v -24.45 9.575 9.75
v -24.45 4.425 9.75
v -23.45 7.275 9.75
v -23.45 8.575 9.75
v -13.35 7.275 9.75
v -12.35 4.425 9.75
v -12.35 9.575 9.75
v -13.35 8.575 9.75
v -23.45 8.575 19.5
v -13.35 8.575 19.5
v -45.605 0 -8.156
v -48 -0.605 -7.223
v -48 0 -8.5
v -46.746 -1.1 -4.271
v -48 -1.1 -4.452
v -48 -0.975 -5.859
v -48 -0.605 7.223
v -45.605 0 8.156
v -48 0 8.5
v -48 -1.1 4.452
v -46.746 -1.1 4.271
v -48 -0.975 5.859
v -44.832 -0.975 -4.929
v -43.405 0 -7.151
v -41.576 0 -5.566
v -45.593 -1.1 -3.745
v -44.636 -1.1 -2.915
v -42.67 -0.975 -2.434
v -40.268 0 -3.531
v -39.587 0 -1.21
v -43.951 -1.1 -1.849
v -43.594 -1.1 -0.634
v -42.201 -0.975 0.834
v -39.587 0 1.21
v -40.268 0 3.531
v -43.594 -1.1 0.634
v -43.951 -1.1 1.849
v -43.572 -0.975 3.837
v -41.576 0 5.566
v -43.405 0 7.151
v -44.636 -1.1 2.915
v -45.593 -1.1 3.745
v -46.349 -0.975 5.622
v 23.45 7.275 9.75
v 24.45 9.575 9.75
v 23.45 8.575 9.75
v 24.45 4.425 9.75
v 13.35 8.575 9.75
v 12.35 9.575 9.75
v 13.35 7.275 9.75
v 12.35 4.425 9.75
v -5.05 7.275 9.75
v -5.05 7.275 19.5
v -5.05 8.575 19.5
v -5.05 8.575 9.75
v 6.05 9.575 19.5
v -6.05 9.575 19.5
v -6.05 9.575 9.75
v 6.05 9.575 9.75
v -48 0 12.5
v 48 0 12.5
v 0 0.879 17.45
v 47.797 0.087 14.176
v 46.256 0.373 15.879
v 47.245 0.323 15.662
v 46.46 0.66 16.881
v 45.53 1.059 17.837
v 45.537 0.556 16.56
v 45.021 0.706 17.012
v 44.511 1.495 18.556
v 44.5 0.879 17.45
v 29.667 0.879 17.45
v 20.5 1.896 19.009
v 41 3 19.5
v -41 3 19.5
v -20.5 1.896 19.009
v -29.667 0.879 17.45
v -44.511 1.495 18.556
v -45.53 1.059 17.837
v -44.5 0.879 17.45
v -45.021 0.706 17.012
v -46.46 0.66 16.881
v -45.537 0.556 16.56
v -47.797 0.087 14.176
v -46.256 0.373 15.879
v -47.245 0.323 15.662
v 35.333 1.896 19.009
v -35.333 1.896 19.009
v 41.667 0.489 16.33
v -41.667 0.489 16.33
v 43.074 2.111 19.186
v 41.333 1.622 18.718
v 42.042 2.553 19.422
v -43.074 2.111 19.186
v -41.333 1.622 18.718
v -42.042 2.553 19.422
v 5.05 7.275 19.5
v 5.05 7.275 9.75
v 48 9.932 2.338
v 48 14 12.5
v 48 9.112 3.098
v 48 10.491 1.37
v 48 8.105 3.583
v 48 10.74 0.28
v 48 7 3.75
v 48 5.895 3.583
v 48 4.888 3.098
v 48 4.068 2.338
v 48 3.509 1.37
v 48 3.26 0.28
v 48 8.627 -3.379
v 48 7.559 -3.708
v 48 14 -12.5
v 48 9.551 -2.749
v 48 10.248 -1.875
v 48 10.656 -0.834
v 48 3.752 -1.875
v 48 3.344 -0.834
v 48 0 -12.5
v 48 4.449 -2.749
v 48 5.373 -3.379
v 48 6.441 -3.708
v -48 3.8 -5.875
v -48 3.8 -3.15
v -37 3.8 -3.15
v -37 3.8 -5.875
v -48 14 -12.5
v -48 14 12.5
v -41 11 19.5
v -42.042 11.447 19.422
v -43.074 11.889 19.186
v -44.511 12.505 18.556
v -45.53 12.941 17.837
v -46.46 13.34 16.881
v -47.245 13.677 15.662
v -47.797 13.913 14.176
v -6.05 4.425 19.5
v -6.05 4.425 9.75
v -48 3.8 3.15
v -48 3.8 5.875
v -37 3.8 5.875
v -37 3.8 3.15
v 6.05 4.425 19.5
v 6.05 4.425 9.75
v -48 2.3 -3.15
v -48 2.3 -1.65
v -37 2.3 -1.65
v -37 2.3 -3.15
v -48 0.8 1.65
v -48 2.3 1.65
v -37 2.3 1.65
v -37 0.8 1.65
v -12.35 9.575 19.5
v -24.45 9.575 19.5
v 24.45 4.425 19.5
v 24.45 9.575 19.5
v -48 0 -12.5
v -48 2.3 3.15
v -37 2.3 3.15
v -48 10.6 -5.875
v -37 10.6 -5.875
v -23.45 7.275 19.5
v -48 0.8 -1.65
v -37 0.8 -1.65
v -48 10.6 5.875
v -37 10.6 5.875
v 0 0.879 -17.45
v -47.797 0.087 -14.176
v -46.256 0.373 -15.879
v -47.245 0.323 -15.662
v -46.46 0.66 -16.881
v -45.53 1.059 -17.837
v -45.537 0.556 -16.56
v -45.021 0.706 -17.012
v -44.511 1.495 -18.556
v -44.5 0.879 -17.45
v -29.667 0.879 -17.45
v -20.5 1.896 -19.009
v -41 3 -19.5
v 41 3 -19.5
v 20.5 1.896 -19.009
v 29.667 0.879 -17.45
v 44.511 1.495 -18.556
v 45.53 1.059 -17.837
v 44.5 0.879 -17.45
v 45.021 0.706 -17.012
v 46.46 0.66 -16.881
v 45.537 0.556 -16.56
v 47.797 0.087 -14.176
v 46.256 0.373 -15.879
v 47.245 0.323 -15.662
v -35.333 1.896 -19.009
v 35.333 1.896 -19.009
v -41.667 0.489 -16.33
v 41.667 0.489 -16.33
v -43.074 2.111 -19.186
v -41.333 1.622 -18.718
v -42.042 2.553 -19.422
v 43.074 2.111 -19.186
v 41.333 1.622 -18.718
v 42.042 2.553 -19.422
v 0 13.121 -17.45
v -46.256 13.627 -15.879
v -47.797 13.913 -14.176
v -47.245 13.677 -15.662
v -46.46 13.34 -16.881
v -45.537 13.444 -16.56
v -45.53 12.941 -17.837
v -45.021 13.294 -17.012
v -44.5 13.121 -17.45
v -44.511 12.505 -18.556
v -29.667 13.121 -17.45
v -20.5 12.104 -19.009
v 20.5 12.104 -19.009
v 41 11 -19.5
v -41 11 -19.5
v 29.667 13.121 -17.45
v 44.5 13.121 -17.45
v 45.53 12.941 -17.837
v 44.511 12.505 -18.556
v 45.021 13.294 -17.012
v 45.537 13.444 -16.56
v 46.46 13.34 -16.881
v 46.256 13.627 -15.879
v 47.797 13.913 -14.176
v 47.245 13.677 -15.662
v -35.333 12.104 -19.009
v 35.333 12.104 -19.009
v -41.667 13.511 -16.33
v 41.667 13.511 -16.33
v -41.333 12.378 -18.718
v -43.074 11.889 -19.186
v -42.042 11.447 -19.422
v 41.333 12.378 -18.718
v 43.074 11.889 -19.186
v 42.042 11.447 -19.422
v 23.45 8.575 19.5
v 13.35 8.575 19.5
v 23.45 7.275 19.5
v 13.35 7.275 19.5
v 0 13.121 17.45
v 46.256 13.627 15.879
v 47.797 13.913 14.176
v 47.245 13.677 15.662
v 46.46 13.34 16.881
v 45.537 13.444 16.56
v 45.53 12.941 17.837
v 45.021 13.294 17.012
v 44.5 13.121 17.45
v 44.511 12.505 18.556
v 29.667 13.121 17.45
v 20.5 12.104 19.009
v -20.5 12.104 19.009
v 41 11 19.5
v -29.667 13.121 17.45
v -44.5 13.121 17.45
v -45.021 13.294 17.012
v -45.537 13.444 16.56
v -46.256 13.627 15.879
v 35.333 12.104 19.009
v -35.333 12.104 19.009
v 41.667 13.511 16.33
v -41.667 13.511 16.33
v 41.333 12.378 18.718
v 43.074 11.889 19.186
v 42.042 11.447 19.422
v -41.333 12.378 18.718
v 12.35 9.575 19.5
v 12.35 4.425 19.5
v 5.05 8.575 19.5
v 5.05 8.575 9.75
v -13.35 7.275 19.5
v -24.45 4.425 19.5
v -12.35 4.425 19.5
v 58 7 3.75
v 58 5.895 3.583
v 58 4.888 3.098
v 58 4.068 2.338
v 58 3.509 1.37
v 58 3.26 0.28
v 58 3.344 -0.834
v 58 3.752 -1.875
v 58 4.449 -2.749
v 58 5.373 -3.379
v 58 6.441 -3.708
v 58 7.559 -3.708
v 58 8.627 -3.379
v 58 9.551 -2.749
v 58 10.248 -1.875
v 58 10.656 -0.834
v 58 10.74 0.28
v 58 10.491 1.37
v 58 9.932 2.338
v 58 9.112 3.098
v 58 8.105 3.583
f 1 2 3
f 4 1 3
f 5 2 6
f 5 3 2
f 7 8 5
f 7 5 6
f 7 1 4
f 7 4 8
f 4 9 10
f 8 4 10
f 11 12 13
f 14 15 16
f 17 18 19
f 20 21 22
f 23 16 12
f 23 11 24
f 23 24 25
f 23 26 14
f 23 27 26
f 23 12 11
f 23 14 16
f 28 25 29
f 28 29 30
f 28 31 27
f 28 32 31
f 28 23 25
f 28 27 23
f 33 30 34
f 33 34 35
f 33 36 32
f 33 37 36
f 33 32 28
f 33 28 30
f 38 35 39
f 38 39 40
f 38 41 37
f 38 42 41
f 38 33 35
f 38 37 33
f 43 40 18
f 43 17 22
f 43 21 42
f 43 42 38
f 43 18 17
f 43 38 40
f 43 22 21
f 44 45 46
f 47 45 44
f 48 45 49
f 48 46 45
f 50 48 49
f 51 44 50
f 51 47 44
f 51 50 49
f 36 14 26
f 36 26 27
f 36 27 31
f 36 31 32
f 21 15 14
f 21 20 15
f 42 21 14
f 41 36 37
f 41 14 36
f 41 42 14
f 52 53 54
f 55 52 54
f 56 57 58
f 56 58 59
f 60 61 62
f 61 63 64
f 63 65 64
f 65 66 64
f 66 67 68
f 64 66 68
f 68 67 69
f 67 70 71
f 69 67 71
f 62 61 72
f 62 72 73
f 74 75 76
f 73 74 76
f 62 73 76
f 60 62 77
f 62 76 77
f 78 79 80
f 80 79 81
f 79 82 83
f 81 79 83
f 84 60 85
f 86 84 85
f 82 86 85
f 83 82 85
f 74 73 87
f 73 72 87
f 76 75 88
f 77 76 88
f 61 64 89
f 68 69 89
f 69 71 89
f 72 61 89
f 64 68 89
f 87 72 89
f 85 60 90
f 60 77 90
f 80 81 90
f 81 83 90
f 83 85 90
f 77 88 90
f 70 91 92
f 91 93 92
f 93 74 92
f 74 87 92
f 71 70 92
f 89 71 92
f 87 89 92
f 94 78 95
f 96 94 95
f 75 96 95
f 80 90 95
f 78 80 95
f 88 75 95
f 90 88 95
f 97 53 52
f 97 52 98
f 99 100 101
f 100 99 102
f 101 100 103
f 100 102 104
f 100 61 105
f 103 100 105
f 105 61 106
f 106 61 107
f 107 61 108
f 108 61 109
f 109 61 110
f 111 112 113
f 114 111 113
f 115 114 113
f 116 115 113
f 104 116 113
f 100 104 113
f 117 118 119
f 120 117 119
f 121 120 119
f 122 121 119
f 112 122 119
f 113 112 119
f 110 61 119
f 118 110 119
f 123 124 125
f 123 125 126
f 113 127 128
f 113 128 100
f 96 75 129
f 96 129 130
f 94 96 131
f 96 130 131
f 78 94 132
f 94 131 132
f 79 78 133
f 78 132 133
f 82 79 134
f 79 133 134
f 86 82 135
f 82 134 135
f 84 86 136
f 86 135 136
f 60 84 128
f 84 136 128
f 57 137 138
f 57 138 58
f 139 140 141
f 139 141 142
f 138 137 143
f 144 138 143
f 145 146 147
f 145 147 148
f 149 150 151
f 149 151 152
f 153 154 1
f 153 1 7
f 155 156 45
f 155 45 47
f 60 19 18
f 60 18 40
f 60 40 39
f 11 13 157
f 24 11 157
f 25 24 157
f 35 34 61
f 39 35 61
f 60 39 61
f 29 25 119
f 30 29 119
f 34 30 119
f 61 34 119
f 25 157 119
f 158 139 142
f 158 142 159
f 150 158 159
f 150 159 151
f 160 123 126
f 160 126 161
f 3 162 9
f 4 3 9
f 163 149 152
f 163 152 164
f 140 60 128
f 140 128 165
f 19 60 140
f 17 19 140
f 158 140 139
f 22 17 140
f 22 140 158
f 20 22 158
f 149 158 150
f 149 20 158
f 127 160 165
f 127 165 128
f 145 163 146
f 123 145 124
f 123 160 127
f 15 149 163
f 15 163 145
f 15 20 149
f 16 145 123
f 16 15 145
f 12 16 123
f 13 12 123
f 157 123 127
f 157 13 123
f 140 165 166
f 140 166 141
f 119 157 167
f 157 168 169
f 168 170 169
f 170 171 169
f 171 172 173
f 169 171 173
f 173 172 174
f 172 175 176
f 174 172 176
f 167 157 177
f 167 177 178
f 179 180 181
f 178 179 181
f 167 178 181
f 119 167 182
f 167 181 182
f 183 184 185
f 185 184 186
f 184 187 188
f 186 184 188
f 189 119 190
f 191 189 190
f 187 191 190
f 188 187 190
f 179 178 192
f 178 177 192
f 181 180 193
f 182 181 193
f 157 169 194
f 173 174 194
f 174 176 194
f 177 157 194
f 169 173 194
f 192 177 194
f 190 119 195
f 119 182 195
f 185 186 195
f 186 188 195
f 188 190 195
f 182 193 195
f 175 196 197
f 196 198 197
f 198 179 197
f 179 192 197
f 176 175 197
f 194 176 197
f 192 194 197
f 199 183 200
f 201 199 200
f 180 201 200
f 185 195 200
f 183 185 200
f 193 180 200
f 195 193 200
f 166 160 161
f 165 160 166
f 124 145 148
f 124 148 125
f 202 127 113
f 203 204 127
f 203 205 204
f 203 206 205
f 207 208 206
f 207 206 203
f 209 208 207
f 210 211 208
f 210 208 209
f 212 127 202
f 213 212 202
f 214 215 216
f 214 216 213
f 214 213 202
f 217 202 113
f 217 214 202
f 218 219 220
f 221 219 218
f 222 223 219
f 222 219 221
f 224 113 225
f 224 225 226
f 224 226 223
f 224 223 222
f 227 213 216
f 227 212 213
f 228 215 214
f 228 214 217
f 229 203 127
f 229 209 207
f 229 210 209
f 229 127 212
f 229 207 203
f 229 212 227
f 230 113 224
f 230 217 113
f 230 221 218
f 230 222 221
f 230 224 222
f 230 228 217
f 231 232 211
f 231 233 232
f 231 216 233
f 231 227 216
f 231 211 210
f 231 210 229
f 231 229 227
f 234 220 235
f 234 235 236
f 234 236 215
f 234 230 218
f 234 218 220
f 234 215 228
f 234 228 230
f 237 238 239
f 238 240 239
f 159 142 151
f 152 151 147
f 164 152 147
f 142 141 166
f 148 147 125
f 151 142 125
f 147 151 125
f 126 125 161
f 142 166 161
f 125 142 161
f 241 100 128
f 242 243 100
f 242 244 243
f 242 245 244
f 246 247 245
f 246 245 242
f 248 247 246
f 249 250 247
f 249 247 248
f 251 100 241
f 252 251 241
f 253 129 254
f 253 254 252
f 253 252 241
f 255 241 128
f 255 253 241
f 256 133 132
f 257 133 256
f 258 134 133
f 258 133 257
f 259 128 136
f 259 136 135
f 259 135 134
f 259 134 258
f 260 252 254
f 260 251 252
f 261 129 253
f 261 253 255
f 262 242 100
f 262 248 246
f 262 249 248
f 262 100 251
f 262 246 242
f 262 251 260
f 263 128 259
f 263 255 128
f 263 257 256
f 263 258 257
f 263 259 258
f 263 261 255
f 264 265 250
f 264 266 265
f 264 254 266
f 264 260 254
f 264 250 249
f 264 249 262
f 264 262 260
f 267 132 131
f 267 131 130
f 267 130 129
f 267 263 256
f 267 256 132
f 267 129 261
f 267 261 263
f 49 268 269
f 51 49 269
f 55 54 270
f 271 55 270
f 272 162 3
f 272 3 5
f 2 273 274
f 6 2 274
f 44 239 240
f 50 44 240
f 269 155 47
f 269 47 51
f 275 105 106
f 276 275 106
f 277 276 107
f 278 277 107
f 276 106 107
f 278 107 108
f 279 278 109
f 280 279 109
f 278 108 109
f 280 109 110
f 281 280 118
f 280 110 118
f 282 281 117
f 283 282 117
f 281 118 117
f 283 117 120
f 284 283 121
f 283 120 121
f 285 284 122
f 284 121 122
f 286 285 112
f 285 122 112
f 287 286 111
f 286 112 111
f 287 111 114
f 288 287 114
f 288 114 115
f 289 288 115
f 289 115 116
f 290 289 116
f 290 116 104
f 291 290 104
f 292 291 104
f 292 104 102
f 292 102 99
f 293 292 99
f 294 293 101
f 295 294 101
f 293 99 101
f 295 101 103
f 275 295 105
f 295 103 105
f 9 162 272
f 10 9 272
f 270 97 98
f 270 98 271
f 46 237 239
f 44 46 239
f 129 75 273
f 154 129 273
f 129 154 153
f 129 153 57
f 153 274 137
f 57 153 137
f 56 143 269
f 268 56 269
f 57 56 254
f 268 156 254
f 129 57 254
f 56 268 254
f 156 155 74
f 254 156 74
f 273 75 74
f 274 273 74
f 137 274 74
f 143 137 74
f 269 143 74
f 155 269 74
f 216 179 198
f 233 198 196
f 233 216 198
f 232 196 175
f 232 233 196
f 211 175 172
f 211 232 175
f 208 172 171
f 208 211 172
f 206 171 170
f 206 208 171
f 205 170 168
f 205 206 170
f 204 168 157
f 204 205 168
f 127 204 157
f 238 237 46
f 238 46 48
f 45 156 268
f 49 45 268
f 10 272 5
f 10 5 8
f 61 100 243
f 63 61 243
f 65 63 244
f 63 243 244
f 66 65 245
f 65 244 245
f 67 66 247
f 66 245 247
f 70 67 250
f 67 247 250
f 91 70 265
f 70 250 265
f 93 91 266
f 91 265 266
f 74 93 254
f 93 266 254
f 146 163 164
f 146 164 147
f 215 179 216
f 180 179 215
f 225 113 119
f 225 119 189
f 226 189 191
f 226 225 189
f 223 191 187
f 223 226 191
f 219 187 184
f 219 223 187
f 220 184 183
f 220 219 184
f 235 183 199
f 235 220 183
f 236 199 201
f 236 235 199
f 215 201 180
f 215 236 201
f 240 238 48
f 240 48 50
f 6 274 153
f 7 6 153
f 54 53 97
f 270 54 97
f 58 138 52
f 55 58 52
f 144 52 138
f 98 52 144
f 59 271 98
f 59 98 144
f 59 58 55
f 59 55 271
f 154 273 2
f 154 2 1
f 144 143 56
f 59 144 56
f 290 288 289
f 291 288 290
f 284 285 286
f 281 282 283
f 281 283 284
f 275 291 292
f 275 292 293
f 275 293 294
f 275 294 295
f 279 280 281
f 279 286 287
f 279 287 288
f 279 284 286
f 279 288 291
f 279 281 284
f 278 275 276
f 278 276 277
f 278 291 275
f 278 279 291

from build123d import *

# Parameters (mm, degrees)
SZKIC1_W                    = 96
SZKIC1_H                    = 39
DODANIE_WYCI_GNI_CIE1_DEPTH = 14
ZAOKR_GLENIE2_SIZE          = 3
ZAOKR_GLENIE2_SIZE_2        = 7
WYTNIJ_WYCI_GNI_CIE1_REACH  = 55.668
SZKIC3_R                    = 3.75
DODANIE_WYCI_GNI_CIE2_DEPTH = 10
DODANIE_WYCI_GNI_CIE3_DEPTH = 1.1
ZAOKR_GLENIE3_R             = 8
WYTNIJ_WYCI_GNI_CIE2_DEPTH  = 11
SZKIC6_W                    = 12.1
SZKIC6_H                    = 5.15
SZKIC6_W_2                  = 10.1
SZKIC6_H_2                  = 1.3
WYTNIJ_WYCI_GNI_CIE3_DEPTH  = 9.75
SZYK_LINIOWY1_COUNT         = 2
SZYK_LINIOWY1_PITCH         = 18.4
LUSTRO1_COPY_1_SKETCH_W     = 12.1
LUSTRO1_COPY_1_SKETCH_H     = 5.15
LUSTRO1_COPY_1_SKETCH_W_2   = 10.1
LUSTRO1_COPY_1_SKETCH_H_2   = 1.3
LUSTRO1_COPY_1_DEPTH        = 9.75
LUSTRO1_COPY_2_SKETCH_W     = 12.1
LUSTRO1_COPY_2_SKETCH_H     = 5.15
LUSTRO1_COPY_2_SKETCH_W_2   = 10.1
LUSTRO1_COPY_2_SKETCH_H_2   = 1.3
LUSTRO1_COPY_2_DEPTH        = 9.75


with BuildPart() as part:
    # Szkic1 → Dodanie-wyciągnięcie1 (new body)
    with BuildSketch(Plane(origin=(0, 0, 0), x_dir=(1, 0, 0), z_dir=(0, 1, 0))):
        Rectangle(SZKIC1_W, SZKIC1_H)
    extrude(amount=DODANIE_WYCI_GNI_CIE1_DEPTH)

    # Zaokrąglenie2
    # an asymmetric fillet: 7, 3 mm, written as the material it takes off along each edge
    with BuildSketch(Plane(origin=(65.5, 0, -19.5), x_dir=(0, 1, 0), z_dir=(-1, 0, 0)), Plane(origin=(-65.5, 0, 19.5), x_dir=(0, 1, 0), z_dir=(1, 0, 0))) as zaokr_glenie2_piece_1:
        with BuildLine():
            Bezier((ZAOKR_GLENIE2_SIZE, 0), (0, 0), (0, -ZAOKR_GLENIE2_SIZE_2), weights=[1, 0.707106781, 1])
            Line((0, -ZAOKR_GLENIE2_SIZE_2), (0, 0))
            Line((0, 0), (ZAOKR_GLENIE2_SIZE, 0))
        make_face()
    extrude(amount=131, mode=Mode.SUBTRACT)
    with BuildSketch(Plane(origin=(65.5, 14, -19.5), x_dir=(0, -1, 0), z_dir=(-1, 0, 0)), Plane(origin=(-65.5, 14, 19.5), x_dir=(0, -1, 0), z_dir=(1, 0, 0))) as zaokr_glenie2_piece_2:
        with BuildLine():
            Bezier((ZAOKR_GLENIE2_SIZE, 0), (0, 0), (0, ZAOKR_GLENIE2_SIZE_2), weights=[1, 0.707106781, 1])
            Line((0, ZAOKR_GLENIE2_SIZE_2), (0, 0))
            Line((0, 0), (ZAOKR_GLENIE2_SIZE, 0))
        make_face()
    extrude(amount=131, mode=Mode.SUBTRACT)

    # Wytnij-wyciągnięcie1: up to this face of the body (flat: up to its plane)
    wytnij_wyci_gni_cie1_end = Plane(part.part.faces().sort_by_distance((0, 0, 0))[0])
    # Szkic2 → Wytnij-wyciągnięcie1 (cut, up to the picked face)
    with BuildSketch(Plane(origin=(0, 14, 0), x_dir=(1, 0, 0), z_dir=(0, 1, 0)), mode=Mode.PRIVATE) as wytnij_wyci_gni_cie1_sk1:
        with BuildLine():
            Line((-48, -19.5), (-41, -19.5))
            ThreePointArc((-41, -19.5), (-45.949747468, -17.449747468), (-48, -12.5))
            Line((-48, -12.5), (-48, -19.5))
        make_face()
    wytnij_wyci_gni_cie1_tool1 = split(extrude(wytnij_wyci_gni_cie1_sk1.sketch, amount=-WYTNIJ_WYCI_GNI_CIE1_REACH, mode=Mode.PRIVATE), bisect_by=wytnij_wyci_gni_cie1_end, keep=Keep.BOTH, mode=Mode.PRIVATE)
    # Szkic2 → Wytnij-wyciągnięcie1 (cut, up to the picked face)
    with BuildSketch(Plane(origin=(0, 14, 0), x_dir=(1, 0, 0), z_dir=(0, 1, 0)), mode=Mode.PRIVATE) as wytnij_wyci_gni_cie1_sk2:
        with BuildLine():
            Line((-48, 19.5), (-41, 19.5))
            ThreePointArc((-41, 19.5), (-45.949747468, 17.449747468), (-48, 12.5))
            Line((-48, 12.5), (-48, 19.5))
        make_face()
    wytnij_wyci_gni_cie1_tool2 = split(extrude(wytnij_wyci_gni_cie1_sk2.sketch, amount=-WYTNIJ_WYCI_GNI_CIE1_REACH, mode=Mode.PRIVATE), bisect_by=wytnij_wyci_gni_cie1_end, keep=Keep.BOTH, mode=Mode.PRIVATE)
    # Szkic2 → Wytnij-wyciągnięcie1 (cut, up to the picked face)
    with BuildSketch(Plane(origin=(0, 14, 0), x_dir=(1, 0, 0), z_dir=(0, 1, 0)), mode=Mode.PRIVATE) as wytnij_wyci_gni_cie1_sk3:
        with BuildLine():
            Line((48, -19.5), (48, -12.5))
            ThreePointArc((48, -12.5), (45.949747468, -17.449747468), (41, -19.5))
            Line((41, -19.5), (48, -19.5))
        make_face()
    wytnij_wyci_gni_cie1_tool3 = split(extrude(wytnij_wyci_gni_cie1_sk3.sketch, amount=-WYTNIJ_WYCI_GNI_CIE1_REACH, mode=Mode.PRIVATE), bisect_by=wytnij_wyci_gni_cie1_end, keep=Keep.BOTH, mode=Mode.PRIVATE)
    # Szkic2 → Wytnij-wyciągnięcie1 (cut, up to the picked face)
    with BuildSketch(Plane(origin=(0, 14, 0), x_dir=(1, 0, 0), z_dir=(0, 1, 0)), mode=Mode.PRIVATE) as wytnij_wyci_gni_cie1_sk4:
        with BuildLine():
            Line((41, 19.5), (48, 19.5))
            Line((48, 19.5), (48, 12.5))
            ThreePointArc((48, 12.5), (45.949747468, 17.449747468), (41, 19.5))
        make_face()
    wytnij_wyci_gni_cie1_tool4 = split(extrude(wytnij_wyci_gni_cie1_sk4.sketch, amount=-WYTNIJ_WYCI_GNI_CIE1_REACH, mode=Mode.PRIVATE), bisect_by=wytnij_wyci_gni_cie1_end, keep=Keep.BOTH, mode=Mode.PRIVATE)
    add(wytnij_wyci_gni_cie1_tool1.solids().sort_by(Axis((-46.436424, 14, 17.936424), (0, -1, 0)))[0], mode=Mode.SUBTRACT)
    add(wytnij_wyci_gni_cie1_tool2.solids().sort_by(Axis((-46.436424, 14, -17.936424), (0, -1, 0)))[0], mode=Mode.SUBTRACT)
    add(wytnij_wyci_gni_cie1_tool3.solids().sort_by(Axis((46.436424, 14, 17.936424), (0, -1, 0)))[0], mode=Mode.SUBTRACT)
    add(wytnij_wyci_gni_cie1_tool4.solids().sort_by(Axis((46.436424, 14, -17.936424), (0, -1, 0)))[0], mode=Mode.SUBTRACT)

    # Szkic3 → Dodanie-wyciągnięcie2 (add)
    with BuildSketch(Plane(origin=(48, 0, 0), x_dir=(0, 0, -1), z_dir=(1, 0, 0))):
        with Locations(Location((0, 7, 0), (0, 0, 180))):
            Circle(SZKIC3_R)
    extrude(amount=DODANIE_WYCI_GNI_CIE2_DEPTH)

    # Szkic4 → Dodanie-wyciągnięcie3 (add)
    with BuildSketch(Plane.XZ):
        with BuildLine():
            Line((-48, 8.5), (-48, -8.5))
            ThreePointArc((-48, -8.5), (-39.5, 0), (-48, 8.5))
        make_face()
    extrude(amount=DODANIE_WYCI_GNI_CIE3_DEPTH)

    # Zaokrąglenie3
    # the kernel refuses this fillet: 8 mm, written as the material it takes off along each edge
    with BuildSketch(Plane(origin=(-48, -1.1, 0), x_dir=(-0.9293459551729958, 0, -0.36921009683321493), z_dir=(-0.36921009683321493, 0, 0.9293459551729958))) as zaokr_glenie3_piece_1:
        with BuildLine():
            CenterArc((4.451543504, -8), ZAOKR_GLENIE3_R, 59.598452337, 30.401547663)
            Line((4.451543504, 0), (4.451543504, 0.16))
            Line((4.451543504, 0.16), (8.5, 0.16))
            Line((8.5, 0.16), (8.66, 0))
            ThreePointArc((8.66, 0), (8.66, -0.55), (8.58096913, -0.962))
            Line((8.58096913, -0.962), (8.5, -1.1))
        make_face()
    revolve(axis=Axis((-48, -1.1, 0), (0, -1, 0)), revolution_arc=316.666179678, mode=Mode.SUBTRACT)

    # Szkic5 → Wytnij-wyciągnięcie2 (cut)
    with BuildSketch(Plane.ZY.offset(48)):
        Polygon((-5.875, 10.6), (5.875, 10.6), (5.875, 3.8), (3.15, 3.8), (3.15, 2.3), (1.65, 2.3), (1.65, 0.8), (-1.65, 0.8), (-1.65, 2.3), (-3.15, 2.3), (-3.15, 3.8), (-5.875, 3.8), align=None)
    extrude(amount=-WYTNIJ_WYCI_GNI_CIE2_DEPTH, mode=Mode.SUBTRACT)

    # Szkic6 → Wytnij-wyciągnięcie3 (cut)
    with BuildSketch(Plane.XY.offset(19.5)):
        with Locations((0, 7)):
            Rectangle(SZKIC6_W, SZKIC6_H)
        with Locations((0, 7.925)):
            Rectangle(SZKIC6_W_2, SZKIC6_H_2, mode=Mode.SUBTRACT)
    wytnij_wyci_gni_cie3 = extrude(amount=-WYTNIJ_WYCI_GNI_CIE3_DEPTH, mode=Mode.SUBTRACT)

    # Szyk liniowy1: Wytnij-wyciągnięcie3 ×2
    with Locations(*[(-i * SZYK_LINIOWY1_PITCH, 0, 0) for i in range(1, SZYK_LINIOWY1_COUNT)]):
        add(wytnij_wyci_gni_cie3, mode=Mode.SUBTRACT)

    # Lustro1 copy 1 sketch → Lustro1 copy 1 (cut)
    with BuildSketch(Plane(origin=(18.4, 0, 19.5), x_dir=(-1, 0, 0), z_dir=(0, 0, 1))):
        with Locations((0, -7)):
            Rectangle(LUSTRO1_COPY_1_SKETCH_W, LUSTRO1_COPY_1_SKETCH_H)
        with Locations((0, -7.925)):
            Rectangle(LUSTRO1_COPY_1_SKETCH_W_2, LUSTRO1_COPY_1_SKETCH_H_2, mode=Mode.SUBTRACT)
    extrude(amount=-LUSTRO1_COPY_1_DEPTH, mode=Mode.SUBTRACT)

    # Lustro1 copy 2 sketch → Lustro1 copy 2 (cut)
    with BuildSketch(Plane(origin=(0, 0, 19.5), x_dir=(-1, 0, 0), z_dir=(0, 0, 1))):
        with Locations((0, -7)):
            Rectangle(LUSTRO1_COPY_2_SKETCH_W, LUSTRO1_COPY_2_SKETCH_H)
        with Locations((0, -7.925)):
            Rectangle(LUSTRO1_COPY_2_SKETCH_W_2, LUSTRO1_COPY_2_SKETCH_H_2, mode=Mode.SUBTRACT)
    extrude(amount=-LUSTRO1_COPY_2_DEPTH, mode=Mode.SUBTRACT)


solid = part.part
